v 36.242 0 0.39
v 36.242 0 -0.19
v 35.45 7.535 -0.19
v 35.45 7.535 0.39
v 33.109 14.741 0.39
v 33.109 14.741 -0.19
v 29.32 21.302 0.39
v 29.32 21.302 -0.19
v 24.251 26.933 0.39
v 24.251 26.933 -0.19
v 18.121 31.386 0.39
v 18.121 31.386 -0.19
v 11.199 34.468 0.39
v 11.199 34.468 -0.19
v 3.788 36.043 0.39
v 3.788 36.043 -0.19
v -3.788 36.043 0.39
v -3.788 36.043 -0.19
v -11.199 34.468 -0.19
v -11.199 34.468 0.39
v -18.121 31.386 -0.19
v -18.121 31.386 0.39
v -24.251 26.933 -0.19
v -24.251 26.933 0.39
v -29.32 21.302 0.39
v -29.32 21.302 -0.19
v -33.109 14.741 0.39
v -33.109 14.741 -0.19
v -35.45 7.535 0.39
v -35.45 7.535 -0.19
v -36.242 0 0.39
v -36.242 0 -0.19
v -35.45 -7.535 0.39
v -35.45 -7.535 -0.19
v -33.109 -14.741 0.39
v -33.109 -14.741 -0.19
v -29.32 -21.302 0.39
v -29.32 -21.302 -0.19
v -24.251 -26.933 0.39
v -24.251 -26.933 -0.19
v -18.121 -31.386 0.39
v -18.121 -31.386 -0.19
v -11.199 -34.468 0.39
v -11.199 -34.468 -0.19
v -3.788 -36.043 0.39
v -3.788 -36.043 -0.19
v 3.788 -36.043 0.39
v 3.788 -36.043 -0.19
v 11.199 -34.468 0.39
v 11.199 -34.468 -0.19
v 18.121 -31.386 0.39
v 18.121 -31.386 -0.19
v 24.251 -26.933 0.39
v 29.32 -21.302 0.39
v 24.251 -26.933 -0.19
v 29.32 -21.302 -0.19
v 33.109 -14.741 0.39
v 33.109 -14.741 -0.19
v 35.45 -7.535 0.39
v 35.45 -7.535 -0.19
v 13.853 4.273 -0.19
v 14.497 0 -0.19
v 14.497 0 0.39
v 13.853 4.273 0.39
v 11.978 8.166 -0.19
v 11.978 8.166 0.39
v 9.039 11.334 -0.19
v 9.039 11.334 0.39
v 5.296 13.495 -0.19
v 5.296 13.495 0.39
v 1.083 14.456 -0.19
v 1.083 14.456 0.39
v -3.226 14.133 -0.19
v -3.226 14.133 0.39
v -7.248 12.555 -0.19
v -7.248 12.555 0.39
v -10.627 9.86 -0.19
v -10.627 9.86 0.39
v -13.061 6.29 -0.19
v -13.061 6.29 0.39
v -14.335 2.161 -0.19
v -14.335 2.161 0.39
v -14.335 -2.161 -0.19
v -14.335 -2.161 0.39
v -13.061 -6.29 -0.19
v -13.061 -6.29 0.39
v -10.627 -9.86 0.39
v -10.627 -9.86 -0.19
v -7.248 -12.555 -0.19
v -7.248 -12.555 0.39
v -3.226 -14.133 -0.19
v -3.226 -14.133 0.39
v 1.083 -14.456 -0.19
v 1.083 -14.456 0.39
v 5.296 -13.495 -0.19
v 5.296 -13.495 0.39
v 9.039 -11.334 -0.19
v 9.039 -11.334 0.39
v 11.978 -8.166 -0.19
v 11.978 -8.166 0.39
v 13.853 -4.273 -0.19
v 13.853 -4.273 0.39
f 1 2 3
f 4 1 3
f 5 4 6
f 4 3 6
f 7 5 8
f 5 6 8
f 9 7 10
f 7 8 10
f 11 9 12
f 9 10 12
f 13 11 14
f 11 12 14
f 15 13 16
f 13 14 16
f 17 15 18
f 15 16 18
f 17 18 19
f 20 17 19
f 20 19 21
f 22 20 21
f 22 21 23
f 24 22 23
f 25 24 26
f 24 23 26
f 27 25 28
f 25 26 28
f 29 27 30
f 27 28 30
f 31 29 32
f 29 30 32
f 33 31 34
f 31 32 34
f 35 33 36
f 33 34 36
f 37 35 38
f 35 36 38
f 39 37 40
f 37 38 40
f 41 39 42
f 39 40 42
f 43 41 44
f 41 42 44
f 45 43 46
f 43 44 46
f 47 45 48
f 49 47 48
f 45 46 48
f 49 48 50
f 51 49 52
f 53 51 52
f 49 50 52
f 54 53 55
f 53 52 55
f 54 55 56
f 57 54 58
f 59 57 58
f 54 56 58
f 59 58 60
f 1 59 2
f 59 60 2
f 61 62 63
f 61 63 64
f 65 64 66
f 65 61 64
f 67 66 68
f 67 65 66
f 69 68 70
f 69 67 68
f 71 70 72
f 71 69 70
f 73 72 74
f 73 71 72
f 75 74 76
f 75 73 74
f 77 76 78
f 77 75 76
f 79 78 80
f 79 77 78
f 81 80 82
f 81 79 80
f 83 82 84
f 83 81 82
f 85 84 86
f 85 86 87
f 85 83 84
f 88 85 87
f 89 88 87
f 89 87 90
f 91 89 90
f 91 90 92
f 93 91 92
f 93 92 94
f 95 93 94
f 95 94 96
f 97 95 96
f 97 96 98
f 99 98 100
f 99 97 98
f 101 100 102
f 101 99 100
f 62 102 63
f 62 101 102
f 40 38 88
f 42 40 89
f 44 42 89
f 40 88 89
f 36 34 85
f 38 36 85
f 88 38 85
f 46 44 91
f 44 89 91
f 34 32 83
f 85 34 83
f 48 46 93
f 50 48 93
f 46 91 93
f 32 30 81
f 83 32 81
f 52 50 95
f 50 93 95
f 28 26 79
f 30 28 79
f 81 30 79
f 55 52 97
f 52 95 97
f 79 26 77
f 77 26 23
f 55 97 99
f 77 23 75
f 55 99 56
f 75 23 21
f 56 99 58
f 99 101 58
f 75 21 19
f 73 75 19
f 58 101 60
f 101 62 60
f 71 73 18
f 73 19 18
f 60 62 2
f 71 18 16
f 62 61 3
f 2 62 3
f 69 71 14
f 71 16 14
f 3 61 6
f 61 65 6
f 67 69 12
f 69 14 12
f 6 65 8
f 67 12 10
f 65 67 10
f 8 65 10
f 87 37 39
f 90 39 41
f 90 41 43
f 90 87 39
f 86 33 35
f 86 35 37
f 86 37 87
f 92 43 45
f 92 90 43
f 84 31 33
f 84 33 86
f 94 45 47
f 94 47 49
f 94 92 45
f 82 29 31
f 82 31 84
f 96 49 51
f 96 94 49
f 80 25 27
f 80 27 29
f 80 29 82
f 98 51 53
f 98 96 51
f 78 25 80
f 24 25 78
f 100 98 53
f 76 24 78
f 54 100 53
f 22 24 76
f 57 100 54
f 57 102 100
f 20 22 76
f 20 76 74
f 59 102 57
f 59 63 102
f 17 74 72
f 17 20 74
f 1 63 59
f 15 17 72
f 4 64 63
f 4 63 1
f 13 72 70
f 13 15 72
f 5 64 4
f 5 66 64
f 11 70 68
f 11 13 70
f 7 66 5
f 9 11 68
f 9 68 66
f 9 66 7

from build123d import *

# Parameters (mm, degrees)
SKETCH1_R           = 12.5
SKETCH1_R_2         = 5
BOSS_EXTRUDE2_DEPTH = 0.2
SCALE1_SCALE        = 1.9329
SCALE2_SCALE        = 1.5


with BuildPart() as part:
    # Sketch1 → Boss-Extrude2 (new body)
    with BuildSketch(Plane.XY):
        Circle(SKETCH1_R)
        Circle(SKETCH1_R_2, mode=Mode.SUBTRACT)
    extrude(amount=BOSS_EXTRUDE2_DEPTH)


with BuildPart() as part_1:
    # Scale1: scaled about (0, 0, 0.1)
    add(part.part.scale(SCALE1_SCALE).moved(Location((0, 0, -0.09329))))


with BuildPart() as part_2:
    # Scale2: scaled about (0, 0, 0.1)
    add(part_1.part.scale(SCALE2_SCALE).moved(Location((0, 0, -0.05))))


solid = part_2.part
